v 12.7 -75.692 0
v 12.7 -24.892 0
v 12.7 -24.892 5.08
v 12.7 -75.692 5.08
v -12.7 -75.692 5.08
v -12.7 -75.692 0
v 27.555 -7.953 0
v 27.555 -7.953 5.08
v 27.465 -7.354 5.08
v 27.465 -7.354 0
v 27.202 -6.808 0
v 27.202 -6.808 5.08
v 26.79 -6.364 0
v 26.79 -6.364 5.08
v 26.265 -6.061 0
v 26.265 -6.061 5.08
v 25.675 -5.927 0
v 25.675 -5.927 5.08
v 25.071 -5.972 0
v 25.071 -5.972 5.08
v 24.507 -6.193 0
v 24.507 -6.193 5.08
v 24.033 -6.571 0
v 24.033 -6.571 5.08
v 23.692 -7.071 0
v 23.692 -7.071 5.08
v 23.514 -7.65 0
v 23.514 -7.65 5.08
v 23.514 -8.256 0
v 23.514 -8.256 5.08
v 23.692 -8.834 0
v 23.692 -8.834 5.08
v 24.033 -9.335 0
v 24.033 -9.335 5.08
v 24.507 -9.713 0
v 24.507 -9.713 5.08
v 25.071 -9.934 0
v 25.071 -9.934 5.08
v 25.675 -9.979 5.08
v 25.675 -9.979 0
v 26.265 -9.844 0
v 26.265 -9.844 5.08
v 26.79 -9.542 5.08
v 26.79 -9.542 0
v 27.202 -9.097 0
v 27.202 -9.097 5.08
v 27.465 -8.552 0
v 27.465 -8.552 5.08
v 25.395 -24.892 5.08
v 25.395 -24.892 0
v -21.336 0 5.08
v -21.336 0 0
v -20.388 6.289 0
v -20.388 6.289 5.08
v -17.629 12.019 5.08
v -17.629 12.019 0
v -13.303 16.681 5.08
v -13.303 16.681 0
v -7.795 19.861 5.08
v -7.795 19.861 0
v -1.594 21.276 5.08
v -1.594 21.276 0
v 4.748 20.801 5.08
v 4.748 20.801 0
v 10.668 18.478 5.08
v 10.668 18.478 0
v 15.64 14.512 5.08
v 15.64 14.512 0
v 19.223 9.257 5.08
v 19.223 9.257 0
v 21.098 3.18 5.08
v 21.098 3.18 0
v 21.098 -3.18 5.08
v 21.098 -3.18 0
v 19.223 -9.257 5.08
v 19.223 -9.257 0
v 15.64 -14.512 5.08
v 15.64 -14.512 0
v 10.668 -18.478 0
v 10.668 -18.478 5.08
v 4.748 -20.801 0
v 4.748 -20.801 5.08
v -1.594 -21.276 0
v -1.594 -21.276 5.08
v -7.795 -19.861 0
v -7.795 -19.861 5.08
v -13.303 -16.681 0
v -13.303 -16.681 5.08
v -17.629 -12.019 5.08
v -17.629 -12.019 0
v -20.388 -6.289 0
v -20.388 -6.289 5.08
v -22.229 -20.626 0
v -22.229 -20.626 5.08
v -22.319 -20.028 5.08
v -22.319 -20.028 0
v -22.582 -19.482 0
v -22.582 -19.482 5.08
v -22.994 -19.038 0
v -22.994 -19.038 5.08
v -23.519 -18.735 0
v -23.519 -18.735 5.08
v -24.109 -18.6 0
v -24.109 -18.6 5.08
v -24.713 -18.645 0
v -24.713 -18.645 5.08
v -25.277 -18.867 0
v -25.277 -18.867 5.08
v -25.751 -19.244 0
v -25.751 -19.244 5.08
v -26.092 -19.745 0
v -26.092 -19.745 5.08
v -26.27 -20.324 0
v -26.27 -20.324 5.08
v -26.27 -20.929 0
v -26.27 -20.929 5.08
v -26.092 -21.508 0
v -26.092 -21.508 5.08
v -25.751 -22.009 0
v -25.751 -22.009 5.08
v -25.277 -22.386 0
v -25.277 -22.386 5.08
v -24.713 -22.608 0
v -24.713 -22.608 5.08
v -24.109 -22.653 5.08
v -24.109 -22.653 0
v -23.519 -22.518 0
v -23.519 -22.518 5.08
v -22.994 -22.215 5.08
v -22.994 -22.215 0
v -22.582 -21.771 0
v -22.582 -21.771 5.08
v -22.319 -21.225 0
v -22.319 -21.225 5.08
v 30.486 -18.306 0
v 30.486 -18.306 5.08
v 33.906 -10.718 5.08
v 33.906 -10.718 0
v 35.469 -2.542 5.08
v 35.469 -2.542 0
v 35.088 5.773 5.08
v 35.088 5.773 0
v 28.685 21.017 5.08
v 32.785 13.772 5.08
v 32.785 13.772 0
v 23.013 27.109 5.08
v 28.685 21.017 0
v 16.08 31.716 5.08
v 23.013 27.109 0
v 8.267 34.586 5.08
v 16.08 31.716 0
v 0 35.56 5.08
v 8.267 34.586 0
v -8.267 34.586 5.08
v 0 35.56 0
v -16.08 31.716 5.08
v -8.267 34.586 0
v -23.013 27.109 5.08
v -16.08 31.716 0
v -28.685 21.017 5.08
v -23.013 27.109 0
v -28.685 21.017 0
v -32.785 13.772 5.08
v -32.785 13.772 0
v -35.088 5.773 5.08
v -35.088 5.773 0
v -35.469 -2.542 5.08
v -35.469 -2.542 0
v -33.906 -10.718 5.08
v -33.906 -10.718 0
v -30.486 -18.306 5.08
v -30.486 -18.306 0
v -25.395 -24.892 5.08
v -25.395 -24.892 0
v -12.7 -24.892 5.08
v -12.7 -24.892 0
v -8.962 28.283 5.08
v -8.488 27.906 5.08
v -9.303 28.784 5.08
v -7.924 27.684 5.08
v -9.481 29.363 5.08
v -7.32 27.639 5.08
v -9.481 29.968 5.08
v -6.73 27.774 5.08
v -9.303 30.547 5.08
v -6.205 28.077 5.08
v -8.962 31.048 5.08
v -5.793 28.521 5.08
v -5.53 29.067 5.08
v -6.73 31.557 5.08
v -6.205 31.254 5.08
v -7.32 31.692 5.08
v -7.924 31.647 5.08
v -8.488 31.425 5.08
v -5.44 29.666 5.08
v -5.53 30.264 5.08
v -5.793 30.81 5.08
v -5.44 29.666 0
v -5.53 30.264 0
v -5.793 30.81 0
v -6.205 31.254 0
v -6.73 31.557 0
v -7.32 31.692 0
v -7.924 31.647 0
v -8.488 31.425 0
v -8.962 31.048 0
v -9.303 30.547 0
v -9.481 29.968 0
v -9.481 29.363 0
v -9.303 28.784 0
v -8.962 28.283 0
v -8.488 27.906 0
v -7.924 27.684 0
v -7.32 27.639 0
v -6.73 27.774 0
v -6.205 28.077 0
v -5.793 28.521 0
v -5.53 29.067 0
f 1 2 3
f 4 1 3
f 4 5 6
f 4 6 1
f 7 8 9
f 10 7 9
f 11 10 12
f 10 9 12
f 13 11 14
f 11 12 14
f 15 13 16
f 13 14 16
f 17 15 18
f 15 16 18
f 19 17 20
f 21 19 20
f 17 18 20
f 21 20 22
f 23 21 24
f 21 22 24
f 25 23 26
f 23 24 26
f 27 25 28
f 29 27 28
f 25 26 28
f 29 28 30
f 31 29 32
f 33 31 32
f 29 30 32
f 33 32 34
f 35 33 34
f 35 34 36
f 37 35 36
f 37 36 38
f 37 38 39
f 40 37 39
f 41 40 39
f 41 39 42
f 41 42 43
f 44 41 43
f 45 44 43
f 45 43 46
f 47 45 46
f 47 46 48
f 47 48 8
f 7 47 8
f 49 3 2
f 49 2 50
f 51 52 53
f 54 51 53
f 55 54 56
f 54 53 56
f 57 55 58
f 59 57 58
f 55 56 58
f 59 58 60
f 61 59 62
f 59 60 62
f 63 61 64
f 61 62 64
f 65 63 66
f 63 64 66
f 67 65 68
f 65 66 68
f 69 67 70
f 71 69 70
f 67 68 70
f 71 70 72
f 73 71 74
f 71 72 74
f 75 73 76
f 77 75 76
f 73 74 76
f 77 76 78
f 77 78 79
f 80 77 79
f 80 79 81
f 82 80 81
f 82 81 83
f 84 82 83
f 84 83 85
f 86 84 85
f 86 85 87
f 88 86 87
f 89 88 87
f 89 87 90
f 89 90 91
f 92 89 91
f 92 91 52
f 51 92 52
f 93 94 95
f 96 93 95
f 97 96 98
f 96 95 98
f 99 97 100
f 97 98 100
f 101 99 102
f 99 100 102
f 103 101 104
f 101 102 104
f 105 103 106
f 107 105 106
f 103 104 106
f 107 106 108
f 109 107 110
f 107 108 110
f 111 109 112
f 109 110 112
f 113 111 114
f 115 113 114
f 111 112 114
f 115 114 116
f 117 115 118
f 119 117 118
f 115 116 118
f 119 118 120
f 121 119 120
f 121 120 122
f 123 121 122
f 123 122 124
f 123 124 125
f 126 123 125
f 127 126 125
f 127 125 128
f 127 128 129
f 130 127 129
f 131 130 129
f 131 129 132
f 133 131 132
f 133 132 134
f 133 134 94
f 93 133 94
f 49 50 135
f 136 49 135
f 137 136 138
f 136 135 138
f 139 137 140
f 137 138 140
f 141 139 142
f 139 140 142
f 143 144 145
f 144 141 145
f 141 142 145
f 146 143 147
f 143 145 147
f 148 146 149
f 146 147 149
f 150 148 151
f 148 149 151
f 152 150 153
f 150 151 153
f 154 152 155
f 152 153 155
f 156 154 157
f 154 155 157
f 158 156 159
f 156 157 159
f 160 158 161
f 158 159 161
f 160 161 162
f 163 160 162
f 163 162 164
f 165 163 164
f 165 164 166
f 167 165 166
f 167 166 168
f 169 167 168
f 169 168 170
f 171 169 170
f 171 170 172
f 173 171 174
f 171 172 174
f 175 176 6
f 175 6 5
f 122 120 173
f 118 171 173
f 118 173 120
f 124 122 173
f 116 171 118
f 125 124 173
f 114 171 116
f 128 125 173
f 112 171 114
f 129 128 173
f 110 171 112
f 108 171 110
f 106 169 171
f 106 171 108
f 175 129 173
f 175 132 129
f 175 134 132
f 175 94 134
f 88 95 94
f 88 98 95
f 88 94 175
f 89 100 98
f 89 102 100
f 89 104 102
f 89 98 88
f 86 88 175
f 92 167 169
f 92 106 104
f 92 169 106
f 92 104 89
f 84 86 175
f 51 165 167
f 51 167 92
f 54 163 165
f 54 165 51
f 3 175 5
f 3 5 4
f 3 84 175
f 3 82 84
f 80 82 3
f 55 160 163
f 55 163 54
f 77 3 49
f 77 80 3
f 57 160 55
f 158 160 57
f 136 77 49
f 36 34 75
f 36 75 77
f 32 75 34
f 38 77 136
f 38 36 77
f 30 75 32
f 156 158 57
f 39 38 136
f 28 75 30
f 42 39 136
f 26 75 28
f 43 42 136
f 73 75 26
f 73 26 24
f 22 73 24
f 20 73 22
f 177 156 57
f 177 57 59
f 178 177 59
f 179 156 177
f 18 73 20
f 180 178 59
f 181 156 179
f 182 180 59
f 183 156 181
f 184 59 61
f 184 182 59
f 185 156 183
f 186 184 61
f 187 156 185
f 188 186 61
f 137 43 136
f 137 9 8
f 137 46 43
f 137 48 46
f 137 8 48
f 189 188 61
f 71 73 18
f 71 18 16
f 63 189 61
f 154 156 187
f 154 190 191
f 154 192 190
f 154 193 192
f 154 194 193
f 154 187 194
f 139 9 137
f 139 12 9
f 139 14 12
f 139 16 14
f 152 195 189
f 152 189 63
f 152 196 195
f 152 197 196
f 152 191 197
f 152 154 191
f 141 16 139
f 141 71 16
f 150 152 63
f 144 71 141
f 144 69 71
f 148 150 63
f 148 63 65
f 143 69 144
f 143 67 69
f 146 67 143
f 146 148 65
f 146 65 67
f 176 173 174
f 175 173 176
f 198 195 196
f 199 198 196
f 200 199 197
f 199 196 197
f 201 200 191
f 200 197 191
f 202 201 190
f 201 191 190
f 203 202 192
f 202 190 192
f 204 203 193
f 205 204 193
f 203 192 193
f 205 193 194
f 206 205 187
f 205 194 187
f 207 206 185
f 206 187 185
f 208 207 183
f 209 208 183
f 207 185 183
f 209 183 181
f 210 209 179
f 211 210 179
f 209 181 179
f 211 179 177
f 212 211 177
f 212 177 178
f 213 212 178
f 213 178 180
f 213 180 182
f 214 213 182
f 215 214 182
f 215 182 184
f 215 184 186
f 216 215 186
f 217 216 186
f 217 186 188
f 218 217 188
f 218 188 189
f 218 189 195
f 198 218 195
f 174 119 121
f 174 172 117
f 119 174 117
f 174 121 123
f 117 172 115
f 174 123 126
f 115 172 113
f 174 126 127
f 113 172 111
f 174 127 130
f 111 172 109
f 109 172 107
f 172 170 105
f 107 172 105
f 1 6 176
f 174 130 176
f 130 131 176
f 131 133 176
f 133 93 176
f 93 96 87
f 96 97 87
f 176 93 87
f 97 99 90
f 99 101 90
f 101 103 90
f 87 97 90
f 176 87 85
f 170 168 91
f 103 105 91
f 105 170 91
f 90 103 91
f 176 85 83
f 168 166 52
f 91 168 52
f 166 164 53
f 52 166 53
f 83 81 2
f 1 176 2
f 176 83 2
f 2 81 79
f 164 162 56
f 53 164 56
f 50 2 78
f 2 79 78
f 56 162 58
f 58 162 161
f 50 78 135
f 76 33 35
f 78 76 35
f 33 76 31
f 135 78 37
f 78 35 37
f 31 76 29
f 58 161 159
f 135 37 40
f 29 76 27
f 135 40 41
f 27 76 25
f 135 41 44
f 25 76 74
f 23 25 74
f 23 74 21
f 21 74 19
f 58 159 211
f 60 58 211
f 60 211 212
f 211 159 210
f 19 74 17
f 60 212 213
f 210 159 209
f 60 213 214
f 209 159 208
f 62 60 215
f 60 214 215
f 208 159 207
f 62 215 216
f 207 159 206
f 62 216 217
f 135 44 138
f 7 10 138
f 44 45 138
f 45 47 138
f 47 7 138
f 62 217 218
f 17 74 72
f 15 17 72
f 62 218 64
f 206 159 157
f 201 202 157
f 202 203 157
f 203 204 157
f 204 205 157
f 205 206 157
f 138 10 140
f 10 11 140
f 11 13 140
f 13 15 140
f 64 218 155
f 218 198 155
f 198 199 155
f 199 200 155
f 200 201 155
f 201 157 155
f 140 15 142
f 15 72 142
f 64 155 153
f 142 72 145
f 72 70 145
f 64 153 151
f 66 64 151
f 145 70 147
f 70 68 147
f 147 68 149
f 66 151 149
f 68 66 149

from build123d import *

# Parameters (mm, degrees)
SKETCH1_R           = 35.56
BOSS_EXTRUDE1_DEPTH = 5.08
CUT_EXTRUDE1_DEPTH  = 51.545361805
SKETCH7_R           = 2.032
CUT_EXTRUDE2_DEPTH  = 51.545361805
SKETCH8_R           = 21.336
CUT_EXTRUDE3_DEPTH  = 51.545361805
SKETCH9_W           = 25.4
SKETCH9_H           = 5.08
BOSS_EXTRUDE2_DEPTH = 50.8


with BuildPart() as part:
    # Sketch1 → Boss-Extrude1 (new body)
    with BuildSketch(Plane.XY):
        Circle(SKETCH1_R)
    extrude(amount=BOSS_EXTRUDE1_DEPTH)

    # Sketch2 → Cut-Extrude1 (cut, through all)
    with BuildSketch(Plane.XY.offset(5.08)):
        Polygon((0, -35.56), (-36.256055522, -35.56), (-36.256055522, -24.892), (33.75035888, -24.892), (33.75035888, -35.56), align=None)
    extrude(amount=-CUT_EXTRUDE1_DEPTH, mode=Mode.SUBTRACT)

    # Sketch7 → Cut-Extrude2 (cut, through all)
    with BuildSketch(Plane.XY.offset(5.08)):
        with Locations((-24.261099887, -20.626476503)):
            Circle(SKETCH7_R)
        with Locations((-7.471969114, 29.665523497)):
            Circle(SKETCH7_R)
        with Locations((25.522900113, -7.952823738)):
            Circle(SKETCH7_R)
    extrude(amount=-CUT_EXTRUDE2_DEPTH, mode=Mode.SUBTRACT)

    # Sketch8 → Cut-Extrude3 (cut, through all)
    with BuildSketch(Plane(origin=(0, 0, 0), x_dir=(-1, 0, 0), z_dir=(0, 0, -1))):
        Circle(SKETCH8_R)
    extrude(amount=-CUT_EXTRUDE3_DEPTH, mode=Mode.SUBTRACT)

    # Sketch9 → Boss-Extrude2 (add)
    with BuildSketch(Plane.XZ.offset(24.892)):
        with Locations((0, 2.54)):
            Rectangle(SKETCH9_W, SKETCH9_H)
    extrude(amount=BOSS_EXTRUDE2_DEPTH)


solid = part.part
